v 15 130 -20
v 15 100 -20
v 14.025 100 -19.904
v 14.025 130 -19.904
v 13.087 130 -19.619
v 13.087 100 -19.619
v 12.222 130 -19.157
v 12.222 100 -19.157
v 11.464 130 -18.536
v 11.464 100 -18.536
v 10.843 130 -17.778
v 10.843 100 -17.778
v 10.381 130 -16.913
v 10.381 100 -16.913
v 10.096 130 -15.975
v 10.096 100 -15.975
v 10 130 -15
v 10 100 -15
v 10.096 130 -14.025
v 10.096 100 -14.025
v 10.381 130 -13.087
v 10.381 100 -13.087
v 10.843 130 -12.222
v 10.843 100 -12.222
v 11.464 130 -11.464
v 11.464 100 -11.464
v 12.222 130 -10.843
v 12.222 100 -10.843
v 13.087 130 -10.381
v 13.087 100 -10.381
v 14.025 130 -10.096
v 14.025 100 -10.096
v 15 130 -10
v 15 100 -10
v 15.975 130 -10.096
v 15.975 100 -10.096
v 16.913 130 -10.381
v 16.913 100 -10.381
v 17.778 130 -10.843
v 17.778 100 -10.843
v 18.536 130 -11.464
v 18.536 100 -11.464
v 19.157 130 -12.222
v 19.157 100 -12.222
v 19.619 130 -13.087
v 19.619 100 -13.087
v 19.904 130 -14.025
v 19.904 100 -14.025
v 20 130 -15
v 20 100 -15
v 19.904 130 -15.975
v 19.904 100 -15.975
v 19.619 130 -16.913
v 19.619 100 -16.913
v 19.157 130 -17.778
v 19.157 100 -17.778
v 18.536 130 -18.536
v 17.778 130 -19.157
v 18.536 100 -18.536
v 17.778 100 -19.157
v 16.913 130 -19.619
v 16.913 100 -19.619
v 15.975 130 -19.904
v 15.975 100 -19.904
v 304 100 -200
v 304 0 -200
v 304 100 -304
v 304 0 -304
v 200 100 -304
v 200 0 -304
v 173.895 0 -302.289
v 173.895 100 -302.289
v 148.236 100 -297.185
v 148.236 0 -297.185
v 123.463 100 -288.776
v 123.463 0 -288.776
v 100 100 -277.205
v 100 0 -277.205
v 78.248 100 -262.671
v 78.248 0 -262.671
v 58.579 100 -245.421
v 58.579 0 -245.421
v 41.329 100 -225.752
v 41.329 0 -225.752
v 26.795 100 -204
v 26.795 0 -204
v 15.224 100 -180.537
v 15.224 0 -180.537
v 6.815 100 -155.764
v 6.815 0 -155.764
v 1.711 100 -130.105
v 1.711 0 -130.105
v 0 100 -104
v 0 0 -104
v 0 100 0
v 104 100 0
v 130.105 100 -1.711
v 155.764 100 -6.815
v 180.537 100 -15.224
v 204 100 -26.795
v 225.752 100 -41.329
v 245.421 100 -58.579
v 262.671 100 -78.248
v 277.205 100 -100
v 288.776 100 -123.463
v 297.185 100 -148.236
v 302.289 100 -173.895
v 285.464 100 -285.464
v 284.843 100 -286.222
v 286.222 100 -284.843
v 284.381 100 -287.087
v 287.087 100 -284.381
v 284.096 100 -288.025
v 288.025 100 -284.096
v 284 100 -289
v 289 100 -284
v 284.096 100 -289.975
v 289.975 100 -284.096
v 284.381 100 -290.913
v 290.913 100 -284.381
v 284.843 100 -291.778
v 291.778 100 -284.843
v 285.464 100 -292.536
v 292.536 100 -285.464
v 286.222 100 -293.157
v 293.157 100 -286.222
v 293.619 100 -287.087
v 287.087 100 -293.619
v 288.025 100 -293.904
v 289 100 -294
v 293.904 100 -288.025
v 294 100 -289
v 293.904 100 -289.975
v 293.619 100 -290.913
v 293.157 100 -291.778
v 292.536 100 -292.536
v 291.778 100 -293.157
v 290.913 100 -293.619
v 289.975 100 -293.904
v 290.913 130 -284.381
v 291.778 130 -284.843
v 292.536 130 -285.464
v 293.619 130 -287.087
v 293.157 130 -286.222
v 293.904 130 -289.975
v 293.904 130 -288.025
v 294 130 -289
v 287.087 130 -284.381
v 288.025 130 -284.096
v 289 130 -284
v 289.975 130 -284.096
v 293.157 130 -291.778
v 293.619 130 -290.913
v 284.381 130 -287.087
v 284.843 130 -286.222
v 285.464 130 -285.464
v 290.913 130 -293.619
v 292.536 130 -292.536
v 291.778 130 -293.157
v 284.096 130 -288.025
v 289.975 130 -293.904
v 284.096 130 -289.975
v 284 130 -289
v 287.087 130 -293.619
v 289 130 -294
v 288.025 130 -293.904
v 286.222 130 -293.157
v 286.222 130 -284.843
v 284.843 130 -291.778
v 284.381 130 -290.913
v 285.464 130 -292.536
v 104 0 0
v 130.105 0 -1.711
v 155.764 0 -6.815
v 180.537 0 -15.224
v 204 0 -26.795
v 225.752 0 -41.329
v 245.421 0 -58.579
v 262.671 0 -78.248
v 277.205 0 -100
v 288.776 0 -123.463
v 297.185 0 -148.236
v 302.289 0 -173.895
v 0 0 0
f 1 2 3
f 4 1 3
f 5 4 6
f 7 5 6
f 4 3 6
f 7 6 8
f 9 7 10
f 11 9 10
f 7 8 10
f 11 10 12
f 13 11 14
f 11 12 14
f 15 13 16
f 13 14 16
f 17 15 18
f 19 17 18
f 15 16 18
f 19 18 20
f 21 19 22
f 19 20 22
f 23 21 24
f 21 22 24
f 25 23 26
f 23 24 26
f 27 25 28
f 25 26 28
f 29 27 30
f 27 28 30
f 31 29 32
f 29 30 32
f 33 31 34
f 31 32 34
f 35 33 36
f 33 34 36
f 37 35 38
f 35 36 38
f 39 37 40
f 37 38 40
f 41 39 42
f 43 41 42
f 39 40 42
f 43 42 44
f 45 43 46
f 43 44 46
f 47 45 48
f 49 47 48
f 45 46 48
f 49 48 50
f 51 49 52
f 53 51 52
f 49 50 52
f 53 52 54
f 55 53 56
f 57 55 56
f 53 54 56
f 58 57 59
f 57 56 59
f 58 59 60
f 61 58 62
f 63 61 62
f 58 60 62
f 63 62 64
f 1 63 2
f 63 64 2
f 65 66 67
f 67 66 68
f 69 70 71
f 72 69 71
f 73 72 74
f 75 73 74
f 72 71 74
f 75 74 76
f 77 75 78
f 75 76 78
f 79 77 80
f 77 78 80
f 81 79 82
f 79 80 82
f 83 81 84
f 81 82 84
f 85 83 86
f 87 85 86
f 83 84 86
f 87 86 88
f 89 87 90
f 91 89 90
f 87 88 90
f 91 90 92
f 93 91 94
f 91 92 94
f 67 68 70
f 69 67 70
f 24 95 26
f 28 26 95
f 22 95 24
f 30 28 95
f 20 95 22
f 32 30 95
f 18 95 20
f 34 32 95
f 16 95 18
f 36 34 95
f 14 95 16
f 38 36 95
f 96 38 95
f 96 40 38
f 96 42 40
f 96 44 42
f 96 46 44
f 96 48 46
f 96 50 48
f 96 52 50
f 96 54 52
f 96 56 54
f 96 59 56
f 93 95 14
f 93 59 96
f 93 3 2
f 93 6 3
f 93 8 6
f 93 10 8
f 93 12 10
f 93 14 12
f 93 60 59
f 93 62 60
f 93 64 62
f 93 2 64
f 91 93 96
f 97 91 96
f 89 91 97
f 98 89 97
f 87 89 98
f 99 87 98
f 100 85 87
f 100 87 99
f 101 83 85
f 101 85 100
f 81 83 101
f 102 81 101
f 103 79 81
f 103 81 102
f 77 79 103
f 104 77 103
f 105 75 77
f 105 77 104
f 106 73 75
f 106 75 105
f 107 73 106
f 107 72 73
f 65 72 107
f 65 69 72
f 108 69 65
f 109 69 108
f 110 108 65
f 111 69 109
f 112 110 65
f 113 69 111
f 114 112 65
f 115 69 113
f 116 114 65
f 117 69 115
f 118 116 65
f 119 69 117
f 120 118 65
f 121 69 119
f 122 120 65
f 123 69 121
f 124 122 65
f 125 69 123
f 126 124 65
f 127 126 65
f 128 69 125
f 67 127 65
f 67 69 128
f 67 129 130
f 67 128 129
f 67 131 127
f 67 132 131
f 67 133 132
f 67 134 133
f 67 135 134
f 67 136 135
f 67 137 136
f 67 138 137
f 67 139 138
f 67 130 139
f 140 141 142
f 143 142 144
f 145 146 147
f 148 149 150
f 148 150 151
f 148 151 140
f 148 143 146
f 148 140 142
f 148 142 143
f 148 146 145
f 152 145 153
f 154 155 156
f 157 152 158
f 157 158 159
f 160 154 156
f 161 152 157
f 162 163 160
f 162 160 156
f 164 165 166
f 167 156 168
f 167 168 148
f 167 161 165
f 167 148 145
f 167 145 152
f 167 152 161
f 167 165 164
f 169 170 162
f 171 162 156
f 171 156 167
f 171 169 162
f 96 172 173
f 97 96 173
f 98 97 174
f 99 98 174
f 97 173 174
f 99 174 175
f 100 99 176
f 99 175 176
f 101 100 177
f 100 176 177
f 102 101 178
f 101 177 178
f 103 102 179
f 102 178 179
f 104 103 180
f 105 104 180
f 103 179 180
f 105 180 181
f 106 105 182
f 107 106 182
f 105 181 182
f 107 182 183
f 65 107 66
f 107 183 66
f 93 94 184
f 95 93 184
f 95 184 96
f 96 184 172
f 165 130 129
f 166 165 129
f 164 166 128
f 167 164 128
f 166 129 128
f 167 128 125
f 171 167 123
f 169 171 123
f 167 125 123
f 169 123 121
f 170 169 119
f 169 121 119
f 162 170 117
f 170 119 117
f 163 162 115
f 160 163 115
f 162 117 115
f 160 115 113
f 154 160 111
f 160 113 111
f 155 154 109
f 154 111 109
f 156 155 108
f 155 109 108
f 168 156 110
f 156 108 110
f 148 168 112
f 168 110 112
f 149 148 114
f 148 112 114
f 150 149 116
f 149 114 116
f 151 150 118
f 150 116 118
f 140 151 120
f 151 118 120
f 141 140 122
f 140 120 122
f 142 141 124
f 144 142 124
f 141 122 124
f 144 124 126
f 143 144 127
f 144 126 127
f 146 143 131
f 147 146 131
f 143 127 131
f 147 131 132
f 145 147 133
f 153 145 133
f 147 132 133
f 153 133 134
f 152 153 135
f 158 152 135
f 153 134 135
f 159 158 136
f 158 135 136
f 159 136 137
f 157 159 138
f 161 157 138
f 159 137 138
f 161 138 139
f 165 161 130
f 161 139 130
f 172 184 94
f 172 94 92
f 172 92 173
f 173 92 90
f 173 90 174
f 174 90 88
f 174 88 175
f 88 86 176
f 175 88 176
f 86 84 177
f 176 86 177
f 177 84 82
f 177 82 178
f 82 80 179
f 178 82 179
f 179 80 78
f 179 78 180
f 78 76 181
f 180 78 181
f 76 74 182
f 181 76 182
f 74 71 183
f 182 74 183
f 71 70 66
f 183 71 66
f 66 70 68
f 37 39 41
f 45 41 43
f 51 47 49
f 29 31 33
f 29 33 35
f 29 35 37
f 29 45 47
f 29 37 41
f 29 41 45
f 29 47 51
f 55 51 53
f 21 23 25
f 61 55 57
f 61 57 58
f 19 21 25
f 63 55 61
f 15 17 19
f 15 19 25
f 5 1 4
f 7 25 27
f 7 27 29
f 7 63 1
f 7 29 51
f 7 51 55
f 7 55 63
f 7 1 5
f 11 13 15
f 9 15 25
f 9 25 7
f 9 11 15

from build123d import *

# Parameters (mm, degrees)
EXTRUDE_1_DEPTH = 100
SKETCH_2_R      = 5
EXTRUDE_2_DEPTH = 30


with BuildPart() as part:
    # 草圖1 → 填料-伸長1 (new body)
    with BuildSketch(Plane(origin=(0, 0, 0), x_dir=(1, 0, 0), z_dir=(0, 1, 0))):
        with BuildLine():
            Line((0, 0), (104, 0))
            ThreePointArc((104, 0), (245.421356237, 58.578643763), (304, 200))
            Line((304, 200), (304, 304))
            Line((304, 304), (200, 304))
            ThreePointArc((200, 304), (58.578643763, 245.421356237), (0, 104))
            Line((0, 104), (0, 0))
        make_face()
    extrude(amount=EXTRUDE_1_DEPTH)

    # 草圖2 → 填料-伸長2 (add)
    with BuildSketch(Plane(origin=(0, 100, 0), x_dir=(1, 0, 0), z_dir=(0, 1, 0))):
        with Locations(Location((15, 15, 0), (0, 0, 90))):
            Circle(SKETCH_2_R)
        with Locations(Location((289, 289, 0), (0, 0, 90))):
            Circle(SKETCH_2_R)
    extrude(amount=EXTRUDE_2_DEPTH)


solid = part.part
